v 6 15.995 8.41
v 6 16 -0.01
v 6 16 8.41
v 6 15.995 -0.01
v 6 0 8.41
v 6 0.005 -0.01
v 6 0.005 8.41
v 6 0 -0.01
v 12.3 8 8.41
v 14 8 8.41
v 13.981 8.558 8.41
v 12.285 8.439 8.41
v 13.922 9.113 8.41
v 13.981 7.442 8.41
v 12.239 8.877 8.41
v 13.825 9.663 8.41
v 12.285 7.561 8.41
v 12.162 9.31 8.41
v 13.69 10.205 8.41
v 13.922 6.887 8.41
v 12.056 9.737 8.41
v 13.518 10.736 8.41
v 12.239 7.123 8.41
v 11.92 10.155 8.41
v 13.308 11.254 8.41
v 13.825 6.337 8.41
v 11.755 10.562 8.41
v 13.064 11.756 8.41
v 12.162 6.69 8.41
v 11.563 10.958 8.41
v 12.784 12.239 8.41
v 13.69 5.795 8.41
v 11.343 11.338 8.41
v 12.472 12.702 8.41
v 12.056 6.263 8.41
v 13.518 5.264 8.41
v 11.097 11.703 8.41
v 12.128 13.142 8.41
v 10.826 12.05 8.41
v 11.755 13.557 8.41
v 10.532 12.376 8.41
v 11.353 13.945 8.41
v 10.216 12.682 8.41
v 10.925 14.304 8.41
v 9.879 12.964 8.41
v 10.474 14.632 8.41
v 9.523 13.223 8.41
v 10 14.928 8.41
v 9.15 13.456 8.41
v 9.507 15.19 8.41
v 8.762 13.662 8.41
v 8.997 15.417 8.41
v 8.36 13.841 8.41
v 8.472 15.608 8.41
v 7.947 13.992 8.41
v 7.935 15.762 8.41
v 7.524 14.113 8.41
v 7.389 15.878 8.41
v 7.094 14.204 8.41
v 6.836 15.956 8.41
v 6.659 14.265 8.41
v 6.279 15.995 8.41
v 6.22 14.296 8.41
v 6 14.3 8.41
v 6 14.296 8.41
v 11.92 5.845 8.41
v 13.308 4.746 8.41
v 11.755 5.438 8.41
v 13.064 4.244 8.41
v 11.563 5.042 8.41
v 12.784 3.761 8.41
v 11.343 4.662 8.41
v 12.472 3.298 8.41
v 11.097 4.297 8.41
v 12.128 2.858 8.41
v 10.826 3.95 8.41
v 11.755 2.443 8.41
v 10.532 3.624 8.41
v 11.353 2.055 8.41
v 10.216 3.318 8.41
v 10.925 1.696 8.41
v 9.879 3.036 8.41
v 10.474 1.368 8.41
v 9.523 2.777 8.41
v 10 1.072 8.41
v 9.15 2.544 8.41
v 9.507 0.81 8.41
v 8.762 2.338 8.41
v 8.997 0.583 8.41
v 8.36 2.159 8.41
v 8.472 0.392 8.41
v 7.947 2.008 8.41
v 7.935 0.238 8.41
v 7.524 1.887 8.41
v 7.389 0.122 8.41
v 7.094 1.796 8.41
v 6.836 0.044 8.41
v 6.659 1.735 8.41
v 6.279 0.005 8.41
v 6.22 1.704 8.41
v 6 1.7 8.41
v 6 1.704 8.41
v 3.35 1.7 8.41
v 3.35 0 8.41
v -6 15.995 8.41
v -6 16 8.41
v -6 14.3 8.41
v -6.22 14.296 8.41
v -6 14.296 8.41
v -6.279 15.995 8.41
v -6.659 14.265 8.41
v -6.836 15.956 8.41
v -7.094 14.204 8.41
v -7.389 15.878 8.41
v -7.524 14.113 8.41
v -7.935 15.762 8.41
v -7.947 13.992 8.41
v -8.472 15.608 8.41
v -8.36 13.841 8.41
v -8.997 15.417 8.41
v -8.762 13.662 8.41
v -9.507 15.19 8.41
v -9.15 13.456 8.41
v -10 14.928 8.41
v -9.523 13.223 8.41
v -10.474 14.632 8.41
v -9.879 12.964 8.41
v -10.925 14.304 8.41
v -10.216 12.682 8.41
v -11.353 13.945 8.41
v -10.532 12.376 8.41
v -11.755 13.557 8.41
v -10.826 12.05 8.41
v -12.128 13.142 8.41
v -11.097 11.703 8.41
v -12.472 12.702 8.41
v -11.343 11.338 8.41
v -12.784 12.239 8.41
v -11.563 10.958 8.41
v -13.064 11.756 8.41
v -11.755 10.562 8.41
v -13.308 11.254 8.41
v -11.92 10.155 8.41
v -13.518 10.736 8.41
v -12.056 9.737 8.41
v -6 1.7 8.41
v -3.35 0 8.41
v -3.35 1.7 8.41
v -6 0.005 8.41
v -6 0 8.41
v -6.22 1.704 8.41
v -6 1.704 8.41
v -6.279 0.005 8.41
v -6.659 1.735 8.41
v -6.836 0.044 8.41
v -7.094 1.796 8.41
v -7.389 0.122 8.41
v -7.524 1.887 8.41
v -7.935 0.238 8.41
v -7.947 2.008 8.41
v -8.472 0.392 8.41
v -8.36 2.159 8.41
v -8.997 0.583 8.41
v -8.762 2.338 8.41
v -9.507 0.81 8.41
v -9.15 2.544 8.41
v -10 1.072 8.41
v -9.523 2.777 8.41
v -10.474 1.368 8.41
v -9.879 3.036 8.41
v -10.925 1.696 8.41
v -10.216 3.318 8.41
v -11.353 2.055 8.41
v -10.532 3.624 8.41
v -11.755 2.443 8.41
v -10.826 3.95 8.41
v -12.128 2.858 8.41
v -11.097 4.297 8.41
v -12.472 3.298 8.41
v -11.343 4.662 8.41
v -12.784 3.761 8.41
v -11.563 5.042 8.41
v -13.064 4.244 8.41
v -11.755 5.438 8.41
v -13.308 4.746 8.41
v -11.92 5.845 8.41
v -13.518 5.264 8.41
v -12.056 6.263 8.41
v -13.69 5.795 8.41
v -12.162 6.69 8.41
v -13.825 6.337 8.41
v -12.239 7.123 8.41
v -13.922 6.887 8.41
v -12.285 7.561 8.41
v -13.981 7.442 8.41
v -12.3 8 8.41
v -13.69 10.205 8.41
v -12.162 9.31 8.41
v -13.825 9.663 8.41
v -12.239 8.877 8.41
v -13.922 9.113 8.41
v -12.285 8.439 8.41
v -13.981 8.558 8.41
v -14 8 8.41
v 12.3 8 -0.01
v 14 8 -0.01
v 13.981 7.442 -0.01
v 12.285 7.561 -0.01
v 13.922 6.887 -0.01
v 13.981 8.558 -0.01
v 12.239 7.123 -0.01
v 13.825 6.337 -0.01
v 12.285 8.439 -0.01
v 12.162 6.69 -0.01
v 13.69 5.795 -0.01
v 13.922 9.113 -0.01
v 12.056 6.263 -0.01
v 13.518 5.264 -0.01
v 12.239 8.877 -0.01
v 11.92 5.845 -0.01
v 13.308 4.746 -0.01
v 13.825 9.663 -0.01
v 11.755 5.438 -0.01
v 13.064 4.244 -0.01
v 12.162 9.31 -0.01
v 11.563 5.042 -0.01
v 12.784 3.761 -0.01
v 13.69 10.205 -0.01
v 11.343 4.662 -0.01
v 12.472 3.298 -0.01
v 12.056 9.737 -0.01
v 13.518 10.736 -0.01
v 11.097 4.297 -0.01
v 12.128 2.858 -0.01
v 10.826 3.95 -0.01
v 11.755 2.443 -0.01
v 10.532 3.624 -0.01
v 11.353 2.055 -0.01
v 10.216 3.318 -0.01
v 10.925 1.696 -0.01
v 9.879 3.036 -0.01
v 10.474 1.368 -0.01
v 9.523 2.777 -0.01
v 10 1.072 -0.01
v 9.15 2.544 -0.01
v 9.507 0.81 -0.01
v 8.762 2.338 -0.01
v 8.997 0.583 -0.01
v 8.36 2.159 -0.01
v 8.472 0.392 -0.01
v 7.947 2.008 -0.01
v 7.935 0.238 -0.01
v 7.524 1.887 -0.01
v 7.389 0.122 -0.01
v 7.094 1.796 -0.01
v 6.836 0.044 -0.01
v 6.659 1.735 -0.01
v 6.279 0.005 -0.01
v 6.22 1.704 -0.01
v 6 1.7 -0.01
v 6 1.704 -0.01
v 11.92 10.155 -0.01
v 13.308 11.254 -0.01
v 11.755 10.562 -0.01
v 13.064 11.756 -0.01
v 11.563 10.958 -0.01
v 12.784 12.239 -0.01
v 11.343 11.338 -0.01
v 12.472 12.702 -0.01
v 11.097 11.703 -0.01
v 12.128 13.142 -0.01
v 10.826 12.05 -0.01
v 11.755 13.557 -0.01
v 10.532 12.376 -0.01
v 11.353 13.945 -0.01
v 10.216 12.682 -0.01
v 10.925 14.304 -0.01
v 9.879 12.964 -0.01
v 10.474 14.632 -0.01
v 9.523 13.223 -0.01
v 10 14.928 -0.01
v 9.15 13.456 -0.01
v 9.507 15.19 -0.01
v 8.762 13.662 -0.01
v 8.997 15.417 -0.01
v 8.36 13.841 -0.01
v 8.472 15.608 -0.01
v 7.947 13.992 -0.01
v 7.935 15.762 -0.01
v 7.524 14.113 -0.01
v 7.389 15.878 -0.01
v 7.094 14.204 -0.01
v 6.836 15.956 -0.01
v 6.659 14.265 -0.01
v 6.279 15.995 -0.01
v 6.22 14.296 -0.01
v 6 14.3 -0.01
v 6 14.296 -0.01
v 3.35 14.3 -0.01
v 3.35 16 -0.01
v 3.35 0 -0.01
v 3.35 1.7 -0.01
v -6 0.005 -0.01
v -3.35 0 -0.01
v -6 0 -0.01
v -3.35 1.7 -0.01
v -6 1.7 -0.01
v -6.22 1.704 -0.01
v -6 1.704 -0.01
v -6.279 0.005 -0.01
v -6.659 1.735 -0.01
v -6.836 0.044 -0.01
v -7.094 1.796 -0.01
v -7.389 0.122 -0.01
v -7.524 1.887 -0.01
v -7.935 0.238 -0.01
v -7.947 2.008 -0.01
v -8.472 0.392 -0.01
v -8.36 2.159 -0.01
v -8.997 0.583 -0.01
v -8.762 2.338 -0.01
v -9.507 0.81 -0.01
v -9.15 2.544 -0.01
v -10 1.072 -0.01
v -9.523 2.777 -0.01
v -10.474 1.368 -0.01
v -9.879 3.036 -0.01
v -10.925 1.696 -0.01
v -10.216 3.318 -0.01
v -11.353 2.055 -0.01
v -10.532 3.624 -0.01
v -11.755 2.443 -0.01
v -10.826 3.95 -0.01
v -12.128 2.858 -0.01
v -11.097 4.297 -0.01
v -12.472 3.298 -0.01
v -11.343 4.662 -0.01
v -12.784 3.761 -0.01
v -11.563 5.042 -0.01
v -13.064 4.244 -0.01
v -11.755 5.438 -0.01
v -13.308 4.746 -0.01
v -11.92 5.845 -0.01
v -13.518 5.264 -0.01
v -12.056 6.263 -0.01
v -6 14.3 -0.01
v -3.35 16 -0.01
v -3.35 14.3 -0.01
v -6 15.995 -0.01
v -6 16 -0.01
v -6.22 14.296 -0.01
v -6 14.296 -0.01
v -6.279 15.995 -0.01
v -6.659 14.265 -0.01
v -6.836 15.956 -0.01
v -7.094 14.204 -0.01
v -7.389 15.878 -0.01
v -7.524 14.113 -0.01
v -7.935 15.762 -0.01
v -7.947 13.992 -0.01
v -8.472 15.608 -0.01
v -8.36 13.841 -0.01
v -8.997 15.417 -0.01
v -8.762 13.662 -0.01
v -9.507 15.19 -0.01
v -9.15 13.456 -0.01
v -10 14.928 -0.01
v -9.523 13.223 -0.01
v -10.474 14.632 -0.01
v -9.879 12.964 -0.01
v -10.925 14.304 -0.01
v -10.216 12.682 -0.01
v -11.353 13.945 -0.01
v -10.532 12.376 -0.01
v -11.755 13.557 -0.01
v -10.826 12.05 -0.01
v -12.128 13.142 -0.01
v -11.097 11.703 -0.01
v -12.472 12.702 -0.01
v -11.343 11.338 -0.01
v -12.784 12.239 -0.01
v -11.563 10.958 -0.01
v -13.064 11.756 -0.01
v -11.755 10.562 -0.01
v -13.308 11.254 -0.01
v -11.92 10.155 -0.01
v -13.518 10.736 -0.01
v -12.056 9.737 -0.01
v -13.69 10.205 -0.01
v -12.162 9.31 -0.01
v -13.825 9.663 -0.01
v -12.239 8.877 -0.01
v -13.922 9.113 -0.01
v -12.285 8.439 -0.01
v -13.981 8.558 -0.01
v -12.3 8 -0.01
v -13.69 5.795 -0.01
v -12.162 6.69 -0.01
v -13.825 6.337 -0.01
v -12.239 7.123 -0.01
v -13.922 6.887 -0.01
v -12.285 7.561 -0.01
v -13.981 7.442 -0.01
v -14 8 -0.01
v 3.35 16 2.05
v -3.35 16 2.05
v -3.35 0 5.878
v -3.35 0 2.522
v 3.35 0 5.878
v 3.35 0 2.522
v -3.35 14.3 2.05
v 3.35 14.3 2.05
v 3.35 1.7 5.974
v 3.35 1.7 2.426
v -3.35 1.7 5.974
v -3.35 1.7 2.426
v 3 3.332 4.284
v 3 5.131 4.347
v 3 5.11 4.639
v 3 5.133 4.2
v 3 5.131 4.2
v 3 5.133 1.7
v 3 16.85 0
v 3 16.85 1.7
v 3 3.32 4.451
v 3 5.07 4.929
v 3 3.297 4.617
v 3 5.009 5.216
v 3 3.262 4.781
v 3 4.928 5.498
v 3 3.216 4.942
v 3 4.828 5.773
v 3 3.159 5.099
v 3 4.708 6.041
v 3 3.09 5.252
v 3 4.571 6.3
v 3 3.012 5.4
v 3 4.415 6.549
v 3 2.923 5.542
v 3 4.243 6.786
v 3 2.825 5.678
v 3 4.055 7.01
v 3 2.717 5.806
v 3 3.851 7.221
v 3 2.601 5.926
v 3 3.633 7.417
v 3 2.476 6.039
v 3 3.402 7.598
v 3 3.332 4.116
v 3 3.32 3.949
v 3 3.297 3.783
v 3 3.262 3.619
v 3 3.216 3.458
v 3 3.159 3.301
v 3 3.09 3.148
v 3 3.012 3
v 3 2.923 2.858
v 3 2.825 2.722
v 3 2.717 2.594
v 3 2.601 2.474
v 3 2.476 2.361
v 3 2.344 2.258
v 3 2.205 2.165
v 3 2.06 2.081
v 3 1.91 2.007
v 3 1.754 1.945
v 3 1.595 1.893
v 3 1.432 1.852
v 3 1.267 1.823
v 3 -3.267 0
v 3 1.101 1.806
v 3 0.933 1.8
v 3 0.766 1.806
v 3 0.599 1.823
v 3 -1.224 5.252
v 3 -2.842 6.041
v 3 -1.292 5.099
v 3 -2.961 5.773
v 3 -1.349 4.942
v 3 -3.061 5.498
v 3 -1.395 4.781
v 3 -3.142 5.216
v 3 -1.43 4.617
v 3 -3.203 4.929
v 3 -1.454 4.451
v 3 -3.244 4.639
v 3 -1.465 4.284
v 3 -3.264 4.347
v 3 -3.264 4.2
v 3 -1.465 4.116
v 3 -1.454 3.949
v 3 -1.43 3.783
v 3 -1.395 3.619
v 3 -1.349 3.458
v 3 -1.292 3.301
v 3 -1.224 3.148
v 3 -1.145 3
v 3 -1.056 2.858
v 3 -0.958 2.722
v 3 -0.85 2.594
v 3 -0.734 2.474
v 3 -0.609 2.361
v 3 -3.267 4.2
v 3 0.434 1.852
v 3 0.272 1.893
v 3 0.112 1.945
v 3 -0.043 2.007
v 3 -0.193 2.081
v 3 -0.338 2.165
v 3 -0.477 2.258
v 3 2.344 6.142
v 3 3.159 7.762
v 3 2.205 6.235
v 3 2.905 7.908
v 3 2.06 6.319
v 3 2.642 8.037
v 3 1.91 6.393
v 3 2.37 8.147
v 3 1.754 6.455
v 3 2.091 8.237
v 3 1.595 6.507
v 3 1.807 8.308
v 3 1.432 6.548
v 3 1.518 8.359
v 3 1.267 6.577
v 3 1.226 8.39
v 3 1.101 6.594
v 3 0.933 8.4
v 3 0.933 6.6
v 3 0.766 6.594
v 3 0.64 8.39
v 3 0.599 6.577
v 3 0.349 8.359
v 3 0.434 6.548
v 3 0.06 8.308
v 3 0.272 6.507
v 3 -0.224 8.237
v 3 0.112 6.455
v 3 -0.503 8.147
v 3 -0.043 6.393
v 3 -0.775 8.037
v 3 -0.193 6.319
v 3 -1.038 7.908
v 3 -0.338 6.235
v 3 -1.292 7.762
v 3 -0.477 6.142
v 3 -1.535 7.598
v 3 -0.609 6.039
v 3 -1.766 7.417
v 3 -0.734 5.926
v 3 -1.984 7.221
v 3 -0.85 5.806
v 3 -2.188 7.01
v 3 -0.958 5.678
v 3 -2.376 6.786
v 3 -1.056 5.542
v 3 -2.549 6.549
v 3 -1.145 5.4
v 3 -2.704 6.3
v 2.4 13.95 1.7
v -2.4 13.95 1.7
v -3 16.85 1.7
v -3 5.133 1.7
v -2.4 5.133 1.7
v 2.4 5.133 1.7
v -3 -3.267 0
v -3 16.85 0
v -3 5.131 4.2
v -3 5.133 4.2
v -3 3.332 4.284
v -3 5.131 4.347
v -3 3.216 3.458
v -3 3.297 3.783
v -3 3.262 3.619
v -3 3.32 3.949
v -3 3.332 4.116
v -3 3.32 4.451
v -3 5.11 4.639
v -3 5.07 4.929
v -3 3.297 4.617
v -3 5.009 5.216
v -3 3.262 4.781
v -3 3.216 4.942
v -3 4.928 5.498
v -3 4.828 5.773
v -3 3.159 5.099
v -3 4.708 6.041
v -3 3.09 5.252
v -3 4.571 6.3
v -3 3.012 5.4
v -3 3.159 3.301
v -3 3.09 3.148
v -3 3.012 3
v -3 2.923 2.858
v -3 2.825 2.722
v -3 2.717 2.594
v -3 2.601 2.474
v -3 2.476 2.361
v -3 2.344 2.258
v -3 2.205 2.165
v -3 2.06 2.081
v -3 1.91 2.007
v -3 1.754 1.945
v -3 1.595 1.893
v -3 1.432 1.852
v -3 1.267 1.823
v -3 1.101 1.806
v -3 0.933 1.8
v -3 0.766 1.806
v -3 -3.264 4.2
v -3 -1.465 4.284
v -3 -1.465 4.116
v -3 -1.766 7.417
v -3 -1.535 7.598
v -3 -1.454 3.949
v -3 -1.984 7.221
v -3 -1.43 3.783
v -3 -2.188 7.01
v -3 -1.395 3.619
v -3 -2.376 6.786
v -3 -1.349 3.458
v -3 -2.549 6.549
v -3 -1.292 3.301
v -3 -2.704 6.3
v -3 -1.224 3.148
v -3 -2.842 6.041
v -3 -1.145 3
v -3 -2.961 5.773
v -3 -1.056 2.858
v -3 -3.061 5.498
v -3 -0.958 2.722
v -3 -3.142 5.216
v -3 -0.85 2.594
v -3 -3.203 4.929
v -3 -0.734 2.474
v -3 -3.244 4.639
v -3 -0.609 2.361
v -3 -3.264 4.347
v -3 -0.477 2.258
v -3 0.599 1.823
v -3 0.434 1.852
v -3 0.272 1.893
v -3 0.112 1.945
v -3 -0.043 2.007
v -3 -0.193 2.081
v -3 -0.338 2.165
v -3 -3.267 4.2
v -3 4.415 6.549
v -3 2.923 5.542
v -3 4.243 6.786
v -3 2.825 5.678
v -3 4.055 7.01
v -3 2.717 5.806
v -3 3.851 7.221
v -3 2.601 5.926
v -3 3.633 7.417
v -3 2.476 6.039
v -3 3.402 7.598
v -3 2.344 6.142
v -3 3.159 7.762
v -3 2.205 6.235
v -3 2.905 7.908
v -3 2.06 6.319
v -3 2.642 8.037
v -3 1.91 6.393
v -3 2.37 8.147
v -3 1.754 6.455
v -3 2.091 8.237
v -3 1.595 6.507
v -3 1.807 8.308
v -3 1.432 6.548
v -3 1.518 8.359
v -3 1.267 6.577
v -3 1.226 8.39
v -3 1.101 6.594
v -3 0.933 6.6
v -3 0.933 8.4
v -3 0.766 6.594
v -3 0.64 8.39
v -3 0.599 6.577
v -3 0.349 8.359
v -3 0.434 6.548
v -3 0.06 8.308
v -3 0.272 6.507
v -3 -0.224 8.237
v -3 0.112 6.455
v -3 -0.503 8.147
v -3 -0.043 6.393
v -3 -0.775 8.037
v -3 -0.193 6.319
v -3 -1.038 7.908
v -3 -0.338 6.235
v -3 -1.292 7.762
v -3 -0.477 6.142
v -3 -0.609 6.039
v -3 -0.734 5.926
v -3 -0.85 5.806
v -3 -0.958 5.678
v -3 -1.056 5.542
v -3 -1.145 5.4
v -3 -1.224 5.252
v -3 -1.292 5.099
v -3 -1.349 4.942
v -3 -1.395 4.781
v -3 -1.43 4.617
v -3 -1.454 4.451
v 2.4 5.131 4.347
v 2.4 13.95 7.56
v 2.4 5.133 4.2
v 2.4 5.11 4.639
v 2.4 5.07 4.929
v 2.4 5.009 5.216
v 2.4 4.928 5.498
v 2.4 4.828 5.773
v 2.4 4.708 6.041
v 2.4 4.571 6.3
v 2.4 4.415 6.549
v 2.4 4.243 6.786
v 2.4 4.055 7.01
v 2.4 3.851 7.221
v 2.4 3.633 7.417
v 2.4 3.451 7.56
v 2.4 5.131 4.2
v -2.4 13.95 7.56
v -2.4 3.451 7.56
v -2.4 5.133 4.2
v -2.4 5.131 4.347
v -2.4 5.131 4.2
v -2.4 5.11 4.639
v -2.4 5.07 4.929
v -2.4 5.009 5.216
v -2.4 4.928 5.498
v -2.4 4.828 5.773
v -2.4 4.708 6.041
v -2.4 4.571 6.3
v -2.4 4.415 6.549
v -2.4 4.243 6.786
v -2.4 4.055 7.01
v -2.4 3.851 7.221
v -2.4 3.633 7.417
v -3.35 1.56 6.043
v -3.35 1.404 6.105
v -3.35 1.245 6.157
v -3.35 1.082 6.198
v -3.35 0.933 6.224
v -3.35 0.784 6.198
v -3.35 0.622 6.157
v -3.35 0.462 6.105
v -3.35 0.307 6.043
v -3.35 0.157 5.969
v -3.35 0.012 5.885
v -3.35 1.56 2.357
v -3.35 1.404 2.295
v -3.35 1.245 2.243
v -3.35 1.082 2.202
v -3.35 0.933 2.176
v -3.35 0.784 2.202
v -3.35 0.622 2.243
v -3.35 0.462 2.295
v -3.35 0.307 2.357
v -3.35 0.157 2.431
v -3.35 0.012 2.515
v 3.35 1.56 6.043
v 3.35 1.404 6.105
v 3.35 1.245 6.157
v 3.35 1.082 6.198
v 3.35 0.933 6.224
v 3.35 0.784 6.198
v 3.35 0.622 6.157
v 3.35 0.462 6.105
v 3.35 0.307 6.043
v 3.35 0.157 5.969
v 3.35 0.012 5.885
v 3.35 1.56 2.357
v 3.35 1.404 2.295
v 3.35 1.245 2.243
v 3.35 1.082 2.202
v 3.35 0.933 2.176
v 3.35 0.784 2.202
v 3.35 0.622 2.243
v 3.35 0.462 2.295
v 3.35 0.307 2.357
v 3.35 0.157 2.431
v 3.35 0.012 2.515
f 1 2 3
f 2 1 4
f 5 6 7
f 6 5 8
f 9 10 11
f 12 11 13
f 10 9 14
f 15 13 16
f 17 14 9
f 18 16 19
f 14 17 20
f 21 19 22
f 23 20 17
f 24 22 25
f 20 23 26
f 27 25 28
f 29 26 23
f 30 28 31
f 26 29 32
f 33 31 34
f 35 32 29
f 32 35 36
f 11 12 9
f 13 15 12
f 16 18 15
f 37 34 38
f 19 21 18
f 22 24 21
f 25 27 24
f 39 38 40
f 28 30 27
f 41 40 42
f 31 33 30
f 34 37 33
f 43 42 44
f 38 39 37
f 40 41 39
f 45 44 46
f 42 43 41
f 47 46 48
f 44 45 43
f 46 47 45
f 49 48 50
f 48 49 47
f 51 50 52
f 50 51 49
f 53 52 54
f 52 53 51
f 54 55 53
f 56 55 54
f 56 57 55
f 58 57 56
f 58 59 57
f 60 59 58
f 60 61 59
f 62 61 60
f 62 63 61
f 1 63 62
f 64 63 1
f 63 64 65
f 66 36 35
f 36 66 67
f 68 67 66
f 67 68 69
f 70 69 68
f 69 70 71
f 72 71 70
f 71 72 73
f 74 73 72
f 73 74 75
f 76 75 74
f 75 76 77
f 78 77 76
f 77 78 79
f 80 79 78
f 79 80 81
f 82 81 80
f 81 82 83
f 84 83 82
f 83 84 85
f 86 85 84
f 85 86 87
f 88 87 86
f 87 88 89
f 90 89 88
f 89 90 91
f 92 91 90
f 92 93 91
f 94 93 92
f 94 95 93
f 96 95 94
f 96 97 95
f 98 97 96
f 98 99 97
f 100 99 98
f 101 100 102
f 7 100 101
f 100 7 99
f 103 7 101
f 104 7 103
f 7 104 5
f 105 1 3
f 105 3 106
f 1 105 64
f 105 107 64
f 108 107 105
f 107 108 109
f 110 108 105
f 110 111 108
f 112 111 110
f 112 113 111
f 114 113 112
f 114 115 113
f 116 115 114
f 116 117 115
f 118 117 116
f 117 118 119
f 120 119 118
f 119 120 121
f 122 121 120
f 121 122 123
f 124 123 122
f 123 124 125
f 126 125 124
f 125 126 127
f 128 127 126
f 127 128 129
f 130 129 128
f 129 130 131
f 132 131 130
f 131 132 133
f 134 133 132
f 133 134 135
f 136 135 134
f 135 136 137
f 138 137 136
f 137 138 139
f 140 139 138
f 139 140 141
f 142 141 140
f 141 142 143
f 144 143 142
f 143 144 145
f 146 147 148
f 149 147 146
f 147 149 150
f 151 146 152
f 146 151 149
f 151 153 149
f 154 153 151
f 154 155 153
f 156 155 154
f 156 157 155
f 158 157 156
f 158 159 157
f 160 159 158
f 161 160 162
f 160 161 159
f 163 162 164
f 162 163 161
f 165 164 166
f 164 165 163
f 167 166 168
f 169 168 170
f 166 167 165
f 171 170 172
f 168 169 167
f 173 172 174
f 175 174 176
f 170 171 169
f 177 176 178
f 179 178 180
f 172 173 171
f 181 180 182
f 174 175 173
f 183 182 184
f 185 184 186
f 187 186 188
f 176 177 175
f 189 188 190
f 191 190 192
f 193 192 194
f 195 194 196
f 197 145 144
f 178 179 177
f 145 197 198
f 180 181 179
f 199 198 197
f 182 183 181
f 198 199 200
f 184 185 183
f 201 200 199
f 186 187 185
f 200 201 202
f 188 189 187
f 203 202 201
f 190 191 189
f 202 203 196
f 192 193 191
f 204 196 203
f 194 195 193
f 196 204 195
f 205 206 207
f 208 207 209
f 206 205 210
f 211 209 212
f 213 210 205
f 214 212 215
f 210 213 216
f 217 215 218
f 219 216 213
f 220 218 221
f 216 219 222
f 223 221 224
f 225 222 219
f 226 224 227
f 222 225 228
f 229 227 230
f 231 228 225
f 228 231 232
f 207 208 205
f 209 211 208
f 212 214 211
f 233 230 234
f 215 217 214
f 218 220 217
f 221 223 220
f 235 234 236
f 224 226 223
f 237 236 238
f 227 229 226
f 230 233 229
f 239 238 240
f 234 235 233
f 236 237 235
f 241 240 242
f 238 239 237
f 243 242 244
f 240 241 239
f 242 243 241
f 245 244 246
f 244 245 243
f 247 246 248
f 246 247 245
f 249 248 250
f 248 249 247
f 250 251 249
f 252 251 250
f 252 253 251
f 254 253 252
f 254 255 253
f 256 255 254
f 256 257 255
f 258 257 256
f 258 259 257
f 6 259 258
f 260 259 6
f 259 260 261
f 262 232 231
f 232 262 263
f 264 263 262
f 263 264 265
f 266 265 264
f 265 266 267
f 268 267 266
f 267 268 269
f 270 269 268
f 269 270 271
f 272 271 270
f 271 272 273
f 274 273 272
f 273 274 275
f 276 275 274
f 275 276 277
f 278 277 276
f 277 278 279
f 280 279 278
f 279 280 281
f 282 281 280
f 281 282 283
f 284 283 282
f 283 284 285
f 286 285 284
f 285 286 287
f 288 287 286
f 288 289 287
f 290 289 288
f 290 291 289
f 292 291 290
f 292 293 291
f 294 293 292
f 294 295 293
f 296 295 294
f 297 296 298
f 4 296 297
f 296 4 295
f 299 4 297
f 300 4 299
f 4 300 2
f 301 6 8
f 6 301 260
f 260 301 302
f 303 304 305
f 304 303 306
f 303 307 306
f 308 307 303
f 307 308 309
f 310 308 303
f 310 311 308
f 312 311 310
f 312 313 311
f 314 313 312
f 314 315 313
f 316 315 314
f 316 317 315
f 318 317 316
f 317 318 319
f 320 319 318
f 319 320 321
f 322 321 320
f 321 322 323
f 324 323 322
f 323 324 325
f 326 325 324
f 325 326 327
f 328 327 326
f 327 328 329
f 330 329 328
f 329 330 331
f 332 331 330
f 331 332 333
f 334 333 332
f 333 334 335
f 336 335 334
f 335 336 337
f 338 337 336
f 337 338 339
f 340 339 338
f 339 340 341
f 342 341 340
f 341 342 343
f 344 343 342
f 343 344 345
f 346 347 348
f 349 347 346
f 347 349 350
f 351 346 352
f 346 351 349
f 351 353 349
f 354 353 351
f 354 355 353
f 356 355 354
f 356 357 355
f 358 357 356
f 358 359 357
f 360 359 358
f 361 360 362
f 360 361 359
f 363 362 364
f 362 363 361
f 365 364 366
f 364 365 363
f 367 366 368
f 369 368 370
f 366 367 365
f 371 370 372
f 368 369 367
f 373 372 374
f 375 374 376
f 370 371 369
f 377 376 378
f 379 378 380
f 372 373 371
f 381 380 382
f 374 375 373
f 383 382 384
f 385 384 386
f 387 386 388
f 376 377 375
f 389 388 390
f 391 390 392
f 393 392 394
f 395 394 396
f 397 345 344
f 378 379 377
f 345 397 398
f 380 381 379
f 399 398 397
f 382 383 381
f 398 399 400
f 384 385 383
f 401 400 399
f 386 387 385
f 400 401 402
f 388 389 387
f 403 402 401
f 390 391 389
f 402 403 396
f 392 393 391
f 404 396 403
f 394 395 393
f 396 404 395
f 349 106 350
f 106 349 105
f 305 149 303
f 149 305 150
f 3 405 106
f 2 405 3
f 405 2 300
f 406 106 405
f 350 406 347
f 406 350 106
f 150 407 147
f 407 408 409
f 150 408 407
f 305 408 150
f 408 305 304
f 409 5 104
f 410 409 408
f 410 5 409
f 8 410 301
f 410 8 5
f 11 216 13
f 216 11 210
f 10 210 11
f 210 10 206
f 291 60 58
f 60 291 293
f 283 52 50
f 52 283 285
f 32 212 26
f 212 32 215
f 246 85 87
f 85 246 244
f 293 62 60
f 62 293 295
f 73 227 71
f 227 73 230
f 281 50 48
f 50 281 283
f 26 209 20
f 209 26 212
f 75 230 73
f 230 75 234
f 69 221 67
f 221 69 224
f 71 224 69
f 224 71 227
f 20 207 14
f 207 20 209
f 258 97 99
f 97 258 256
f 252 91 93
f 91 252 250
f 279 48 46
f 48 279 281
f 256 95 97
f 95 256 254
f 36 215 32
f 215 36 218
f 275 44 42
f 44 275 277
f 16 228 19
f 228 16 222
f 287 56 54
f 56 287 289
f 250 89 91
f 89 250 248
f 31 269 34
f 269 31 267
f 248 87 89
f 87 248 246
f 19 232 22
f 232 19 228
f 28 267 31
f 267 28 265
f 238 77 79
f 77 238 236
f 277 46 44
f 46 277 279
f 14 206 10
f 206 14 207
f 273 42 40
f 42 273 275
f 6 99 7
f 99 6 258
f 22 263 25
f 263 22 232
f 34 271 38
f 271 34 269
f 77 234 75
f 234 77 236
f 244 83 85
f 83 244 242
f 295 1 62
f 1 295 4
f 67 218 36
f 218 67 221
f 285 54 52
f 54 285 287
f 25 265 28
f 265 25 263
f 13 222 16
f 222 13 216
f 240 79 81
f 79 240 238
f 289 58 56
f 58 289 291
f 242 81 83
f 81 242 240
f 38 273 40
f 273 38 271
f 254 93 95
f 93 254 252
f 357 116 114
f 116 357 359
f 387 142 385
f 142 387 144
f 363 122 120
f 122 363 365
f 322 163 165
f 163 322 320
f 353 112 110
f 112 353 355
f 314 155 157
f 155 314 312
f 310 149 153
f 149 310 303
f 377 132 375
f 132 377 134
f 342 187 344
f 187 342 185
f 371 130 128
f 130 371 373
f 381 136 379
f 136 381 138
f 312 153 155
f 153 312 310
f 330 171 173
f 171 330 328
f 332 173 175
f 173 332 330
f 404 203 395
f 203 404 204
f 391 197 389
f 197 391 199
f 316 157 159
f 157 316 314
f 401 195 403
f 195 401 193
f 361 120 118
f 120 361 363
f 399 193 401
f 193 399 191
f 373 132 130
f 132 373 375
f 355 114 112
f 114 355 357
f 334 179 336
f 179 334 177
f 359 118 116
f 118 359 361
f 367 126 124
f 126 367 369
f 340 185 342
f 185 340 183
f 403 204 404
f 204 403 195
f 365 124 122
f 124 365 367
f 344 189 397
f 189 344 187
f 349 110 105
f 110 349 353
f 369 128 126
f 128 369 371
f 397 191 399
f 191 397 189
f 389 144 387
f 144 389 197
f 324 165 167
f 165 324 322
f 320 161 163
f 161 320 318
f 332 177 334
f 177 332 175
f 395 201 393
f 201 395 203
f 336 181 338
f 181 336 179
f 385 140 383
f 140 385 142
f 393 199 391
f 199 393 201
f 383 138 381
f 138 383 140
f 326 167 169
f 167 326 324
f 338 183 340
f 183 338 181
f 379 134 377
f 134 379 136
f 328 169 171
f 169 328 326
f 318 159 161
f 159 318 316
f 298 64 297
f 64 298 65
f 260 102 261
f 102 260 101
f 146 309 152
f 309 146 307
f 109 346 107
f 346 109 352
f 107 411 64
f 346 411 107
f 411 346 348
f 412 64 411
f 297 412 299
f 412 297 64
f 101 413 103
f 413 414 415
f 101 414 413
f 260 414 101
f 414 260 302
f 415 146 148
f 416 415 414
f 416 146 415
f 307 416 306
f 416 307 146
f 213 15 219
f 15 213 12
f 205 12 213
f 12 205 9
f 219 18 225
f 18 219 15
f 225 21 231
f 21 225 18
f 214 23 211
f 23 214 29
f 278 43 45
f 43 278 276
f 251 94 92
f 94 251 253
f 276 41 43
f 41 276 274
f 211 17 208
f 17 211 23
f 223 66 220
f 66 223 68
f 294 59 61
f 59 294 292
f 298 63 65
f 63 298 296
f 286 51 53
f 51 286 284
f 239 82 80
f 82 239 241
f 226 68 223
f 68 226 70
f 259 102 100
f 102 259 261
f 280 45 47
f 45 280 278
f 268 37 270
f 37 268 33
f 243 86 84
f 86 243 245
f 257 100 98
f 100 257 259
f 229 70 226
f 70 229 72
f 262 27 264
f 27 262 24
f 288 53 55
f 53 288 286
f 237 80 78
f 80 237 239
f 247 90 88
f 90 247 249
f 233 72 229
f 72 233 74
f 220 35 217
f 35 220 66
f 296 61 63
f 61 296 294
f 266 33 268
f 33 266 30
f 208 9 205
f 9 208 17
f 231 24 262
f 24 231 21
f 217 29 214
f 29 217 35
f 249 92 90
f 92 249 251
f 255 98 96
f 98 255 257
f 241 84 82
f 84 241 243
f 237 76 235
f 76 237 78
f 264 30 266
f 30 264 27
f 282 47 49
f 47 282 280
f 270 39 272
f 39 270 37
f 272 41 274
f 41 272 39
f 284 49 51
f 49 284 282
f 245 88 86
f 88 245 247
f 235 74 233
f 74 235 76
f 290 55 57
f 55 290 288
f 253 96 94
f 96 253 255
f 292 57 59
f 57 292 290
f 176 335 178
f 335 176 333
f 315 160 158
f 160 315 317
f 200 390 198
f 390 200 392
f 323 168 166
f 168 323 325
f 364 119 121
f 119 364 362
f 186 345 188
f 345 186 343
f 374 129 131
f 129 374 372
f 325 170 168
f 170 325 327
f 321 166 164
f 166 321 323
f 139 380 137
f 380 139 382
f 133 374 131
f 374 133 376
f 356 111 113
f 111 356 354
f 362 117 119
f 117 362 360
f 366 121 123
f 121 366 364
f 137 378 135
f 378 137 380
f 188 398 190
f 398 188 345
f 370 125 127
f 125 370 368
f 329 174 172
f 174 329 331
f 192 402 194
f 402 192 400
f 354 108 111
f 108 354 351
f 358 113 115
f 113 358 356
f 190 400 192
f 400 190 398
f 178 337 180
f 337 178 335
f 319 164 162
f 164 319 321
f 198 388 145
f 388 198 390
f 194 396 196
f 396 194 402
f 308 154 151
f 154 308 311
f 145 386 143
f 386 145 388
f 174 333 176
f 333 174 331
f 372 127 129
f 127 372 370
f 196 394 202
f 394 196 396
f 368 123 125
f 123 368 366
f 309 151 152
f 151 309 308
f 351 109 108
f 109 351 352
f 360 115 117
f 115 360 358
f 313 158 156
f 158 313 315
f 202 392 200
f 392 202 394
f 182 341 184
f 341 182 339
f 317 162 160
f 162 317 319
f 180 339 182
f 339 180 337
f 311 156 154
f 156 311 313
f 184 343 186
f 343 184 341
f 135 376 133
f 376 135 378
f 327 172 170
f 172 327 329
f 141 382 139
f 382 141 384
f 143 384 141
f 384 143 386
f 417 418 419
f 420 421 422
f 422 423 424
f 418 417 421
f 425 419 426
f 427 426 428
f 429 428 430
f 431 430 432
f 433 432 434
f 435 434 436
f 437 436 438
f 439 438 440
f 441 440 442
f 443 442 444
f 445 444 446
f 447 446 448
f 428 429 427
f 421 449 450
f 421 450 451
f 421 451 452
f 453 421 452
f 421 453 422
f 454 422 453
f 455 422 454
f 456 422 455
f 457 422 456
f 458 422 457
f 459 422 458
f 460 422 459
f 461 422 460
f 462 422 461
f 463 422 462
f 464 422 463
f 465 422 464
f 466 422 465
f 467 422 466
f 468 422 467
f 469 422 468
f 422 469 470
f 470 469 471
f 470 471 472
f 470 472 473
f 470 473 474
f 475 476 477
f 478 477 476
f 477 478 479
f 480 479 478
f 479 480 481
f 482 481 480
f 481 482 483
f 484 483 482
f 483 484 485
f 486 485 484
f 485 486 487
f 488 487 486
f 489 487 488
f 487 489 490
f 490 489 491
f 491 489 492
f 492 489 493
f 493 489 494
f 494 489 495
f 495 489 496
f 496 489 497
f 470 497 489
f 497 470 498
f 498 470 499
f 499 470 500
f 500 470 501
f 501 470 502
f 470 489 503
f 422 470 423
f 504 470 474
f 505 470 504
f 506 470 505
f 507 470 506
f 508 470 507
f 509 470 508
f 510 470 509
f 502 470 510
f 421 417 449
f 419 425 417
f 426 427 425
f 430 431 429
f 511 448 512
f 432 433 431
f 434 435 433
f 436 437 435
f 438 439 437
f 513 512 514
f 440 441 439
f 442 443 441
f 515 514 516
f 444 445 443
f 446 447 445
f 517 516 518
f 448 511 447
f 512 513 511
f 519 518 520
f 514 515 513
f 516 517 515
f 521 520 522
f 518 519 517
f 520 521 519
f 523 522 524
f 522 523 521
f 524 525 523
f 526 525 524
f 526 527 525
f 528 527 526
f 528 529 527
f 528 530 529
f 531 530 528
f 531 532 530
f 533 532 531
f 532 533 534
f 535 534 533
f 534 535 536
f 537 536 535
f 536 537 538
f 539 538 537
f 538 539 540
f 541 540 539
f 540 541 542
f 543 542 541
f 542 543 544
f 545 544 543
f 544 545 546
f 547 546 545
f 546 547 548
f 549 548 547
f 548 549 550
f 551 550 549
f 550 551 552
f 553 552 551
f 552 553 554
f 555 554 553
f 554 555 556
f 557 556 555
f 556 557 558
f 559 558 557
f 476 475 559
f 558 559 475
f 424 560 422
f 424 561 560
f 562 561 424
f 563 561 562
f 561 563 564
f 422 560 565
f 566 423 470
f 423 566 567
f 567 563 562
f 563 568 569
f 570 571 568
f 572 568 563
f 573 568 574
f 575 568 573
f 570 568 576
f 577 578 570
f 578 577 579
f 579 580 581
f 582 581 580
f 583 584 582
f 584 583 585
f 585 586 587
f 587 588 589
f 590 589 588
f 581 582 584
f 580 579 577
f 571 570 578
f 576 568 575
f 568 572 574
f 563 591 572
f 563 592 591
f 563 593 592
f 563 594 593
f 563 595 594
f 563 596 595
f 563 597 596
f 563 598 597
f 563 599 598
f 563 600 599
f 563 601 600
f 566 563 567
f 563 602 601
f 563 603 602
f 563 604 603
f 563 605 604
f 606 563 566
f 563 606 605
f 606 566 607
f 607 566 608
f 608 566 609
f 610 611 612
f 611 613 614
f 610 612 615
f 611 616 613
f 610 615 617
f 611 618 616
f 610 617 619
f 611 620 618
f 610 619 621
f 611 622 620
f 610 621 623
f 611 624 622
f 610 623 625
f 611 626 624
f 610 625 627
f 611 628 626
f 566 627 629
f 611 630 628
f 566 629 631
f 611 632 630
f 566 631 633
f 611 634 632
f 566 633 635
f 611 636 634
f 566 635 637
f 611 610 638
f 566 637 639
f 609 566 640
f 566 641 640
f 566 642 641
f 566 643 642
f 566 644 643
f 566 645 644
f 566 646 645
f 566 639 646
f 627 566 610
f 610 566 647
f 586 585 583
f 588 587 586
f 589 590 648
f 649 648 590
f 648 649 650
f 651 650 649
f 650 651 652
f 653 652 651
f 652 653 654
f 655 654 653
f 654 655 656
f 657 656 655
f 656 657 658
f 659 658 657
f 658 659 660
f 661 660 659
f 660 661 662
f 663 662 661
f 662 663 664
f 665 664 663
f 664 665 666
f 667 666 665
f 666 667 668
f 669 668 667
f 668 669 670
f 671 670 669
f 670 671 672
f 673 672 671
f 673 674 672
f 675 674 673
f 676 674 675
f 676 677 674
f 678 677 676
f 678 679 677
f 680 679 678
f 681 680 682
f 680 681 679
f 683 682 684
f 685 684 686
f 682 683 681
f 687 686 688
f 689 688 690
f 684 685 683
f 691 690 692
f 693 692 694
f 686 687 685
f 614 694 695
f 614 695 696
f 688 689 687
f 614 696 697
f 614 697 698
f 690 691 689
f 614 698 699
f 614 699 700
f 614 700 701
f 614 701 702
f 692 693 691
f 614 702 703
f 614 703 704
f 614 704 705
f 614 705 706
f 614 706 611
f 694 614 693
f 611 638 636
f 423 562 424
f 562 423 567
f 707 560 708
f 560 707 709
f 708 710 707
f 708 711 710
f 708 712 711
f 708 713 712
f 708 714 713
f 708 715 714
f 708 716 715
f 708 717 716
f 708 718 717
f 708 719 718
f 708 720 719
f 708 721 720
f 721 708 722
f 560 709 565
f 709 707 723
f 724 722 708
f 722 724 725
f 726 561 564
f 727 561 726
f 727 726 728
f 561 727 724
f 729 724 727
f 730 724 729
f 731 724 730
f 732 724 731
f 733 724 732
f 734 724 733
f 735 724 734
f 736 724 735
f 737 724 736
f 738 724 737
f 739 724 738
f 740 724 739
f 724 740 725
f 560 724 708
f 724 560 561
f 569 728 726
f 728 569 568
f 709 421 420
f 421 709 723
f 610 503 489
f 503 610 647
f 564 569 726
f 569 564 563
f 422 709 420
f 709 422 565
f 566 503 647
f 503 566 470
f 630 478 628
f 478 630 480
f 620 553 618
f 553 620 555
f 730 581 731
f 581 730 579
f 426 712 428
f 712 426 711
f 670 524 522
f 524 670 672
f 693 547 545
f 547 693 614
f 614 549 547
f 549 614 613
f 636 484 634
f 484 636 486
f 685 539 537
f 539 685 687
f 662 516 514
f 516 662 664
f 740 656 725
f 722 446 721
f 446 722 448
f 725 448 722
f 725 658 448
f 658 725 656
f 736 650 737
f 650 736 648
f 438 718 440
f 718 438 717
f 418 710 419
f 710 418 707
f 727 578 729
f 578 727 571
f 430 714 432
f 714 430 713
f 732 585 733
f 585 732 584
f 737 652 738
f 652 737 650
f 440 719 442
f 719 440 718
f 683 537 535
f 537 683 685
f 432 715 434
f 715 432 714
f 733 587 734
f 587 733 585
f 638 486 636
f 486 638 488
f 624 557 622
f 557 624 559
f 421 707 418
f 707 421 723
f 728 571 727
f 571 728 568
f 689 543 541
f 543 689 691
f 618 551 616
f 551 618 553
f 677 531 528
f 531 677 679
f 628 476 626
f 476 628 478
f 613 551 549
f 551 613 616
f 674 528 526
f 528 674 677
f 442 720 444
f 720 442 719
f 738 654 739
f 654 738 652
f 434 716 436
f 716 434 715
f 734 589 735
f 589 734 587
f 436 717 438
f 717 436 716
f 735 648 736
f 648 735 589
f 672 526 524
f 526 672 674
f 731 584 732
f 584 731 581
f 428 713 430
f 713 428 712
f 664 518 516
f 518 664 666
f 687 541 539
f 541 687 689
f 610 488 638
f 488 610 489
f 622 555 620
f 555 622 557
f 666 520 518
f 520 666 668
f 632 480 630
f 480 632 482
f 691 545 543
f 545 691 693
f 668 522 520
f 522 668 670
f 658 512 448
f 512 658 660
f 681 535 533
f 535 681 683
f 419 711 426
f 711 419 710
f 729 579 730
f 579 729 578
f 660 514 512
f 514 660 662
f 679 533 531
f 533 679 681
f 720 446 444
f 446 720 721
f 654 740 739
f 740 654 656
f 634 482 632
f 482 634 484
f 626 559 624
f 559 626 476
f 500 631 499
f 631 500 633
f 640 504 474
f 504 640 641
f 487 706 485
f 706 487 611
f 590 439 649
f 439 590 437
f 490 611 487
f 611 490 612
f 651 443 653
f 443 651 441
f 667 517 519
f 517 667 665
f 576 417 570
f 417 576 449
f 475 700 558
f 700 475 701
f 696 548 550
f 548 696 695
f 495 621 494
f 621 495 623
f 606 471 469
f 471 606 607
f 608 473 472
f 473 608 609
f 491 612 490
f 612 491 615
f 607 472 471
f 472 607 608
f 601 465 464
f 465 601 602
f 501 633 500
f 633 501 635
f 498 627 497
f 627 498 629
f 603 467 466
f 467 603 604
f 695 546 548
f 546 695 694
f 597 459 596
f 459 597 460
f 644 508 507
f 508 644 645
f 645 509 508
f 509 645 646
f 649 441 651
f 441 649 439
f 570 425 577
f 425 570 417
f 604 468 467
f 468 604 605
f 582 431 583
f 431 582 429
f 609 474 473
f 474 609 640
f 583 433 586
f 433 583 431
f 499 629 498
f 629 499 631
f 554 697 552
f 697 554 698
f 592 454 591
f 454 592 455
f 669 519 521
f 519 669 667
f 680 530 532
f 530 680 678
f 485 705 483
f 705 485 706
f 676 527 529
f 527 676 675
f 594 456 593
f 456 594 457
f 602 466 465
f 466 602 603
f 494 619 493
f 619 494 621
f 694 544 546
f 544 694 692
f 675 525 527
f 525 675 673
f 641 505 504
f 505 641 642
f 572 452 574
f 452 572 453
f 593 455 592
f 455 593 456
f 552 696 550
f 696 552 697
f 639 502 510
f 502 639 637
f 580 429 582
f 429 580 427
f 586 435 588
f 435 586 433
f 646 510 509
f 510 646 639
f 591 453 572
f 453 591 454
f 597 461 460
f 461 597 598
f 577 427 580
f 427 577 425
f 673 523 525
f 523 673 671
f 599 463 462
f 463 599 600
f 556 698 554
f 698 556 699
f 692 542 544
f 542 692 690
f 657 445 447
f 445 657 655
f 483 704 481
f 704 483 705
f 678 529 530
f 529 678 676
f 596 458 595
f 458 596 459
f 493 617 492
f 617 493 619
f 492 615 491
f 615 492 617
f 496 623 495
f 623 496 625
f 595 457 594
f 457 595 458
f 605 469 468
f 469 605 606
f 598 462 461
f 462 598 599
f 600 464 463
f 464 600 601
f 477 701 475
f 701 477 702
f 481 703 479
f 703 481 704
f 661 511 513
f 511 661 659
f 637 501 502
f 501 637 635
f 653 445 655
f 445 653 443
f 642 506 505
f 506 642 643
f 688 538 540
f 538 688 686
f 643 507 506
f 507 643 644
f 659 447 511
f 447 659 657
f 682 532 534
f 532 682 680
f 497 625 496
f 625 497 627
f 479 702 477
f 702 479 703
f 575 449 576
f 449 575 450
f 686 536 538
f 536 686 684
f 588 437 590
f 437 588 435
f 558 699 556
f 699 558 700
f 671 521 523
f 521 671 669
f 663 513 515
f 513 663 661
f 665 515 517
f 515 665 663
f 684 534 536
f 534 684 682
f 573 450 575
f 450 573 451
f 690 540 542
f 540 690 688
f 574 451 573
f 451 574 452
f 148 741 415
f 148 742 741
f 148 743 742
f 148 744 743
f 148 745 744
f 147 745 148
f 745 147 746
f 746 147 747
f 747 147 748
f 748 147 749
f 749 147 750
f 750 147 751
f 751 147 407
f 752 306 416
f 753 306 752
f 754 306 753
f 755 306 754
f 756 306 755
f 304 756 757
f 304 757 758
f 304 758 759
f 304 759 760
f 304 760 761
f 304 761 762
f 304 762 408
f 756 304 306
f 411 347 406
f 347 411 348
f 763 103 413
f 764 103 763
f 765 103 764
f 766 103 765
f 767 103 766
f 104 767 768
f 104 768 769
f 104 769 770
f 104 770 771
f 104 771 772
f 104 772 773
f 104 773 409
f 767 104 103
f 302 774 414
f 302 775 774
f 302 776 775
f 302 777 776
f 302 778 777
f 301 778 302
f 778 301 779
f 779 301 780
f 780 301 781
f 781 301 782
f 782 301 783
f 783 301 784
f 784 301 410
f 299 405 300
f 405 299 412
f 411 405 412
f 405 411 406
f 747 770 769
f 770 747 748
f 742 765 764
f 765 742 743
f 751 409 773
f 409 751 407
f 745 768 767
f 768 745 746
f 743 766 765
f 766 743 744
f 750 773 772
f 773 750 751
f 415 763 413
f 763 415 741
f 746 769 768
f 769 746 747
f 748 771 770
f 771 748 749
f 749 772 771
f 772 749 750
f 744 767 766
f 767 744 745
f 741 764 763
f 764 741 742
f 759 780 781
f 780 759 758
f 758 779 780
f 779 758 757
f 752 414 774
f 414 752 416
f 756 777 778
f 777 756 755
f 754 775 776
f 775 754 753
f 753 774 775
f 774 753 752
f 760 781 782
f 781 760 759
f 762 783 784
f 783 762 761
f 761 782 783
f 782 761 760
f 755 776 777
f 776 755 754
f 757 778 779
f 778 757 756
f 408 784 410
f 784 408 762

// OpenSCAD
/* OpenSCAD project.
 * Buckles to hold cables together. 4 different sizes.
 *
 * (C) 2019 by P. Bauermeister
 *
 * See https://github.com/pbauermeister/DIY/tree/master/3d-printing/2019-07-09--earphone-buckles
*/

// Object sizes
SMALL_HEIGHT          =  8.4;
SMALL_WALL_THICKNESS  =  1.7;
SMALL_LENGTH          = 28.0;
SMALL_WIDTH           = 16.0;
SMALL_PRONG_SIZE      =  6.0;

MEDIUM_HEIGHT         =  8.4;
MEDIUM_WALL_THICKNESS =  1.7;
MEDIUM_LENGTH         = 32.0;
MEDIUM_WIDTH          = 17.0;
MEDIUM_PRONG_SIZE     =  7.0;

BIG_HEIGHT            =  8.4;
BIG_WALL_THICKNESS    =  1.9;
BIG_LENGTH            = 40.0;
BIG_WIDTH             = 20.0;
BIG_PRONG_SIZE        =  8.0;

BIGGER_HEIGHT         =  8.4;
BIGGER_WALL_THICKNESS =  1.7;
BIGGER_LENGTH         = 56.0;
BIGGER_WIDTH          = 32.0;
BIGGER_PRONG_SIZE     =  9.0;

// Rendering
DRAFT = false; // false: final rendering, true: disable Minkowski
$fn = 90;

// Globals
PLAY  = 0.7;
SPACE = PLAY/2;
ATOM  = 0.01;

// Transform: Grow object, useful to carve another object with a play margin
module grow_object() {
    if (DRAFT) {
        // do not grow, much faster
        children();
    } else {
        // grow size in each dimension (by a cube)
        minkowski() {
            children();
            cube([PLAY, PLAY, PLAY], true);
        }
    }
}

// Transform: Shift object in Y direction
module move(by) {
    translate([0, by, 0])
    children();
}

// Helper object: A hollow full buckle, to create the base object, as well as as a cavity
module full_buckle(offset, height, length, width) {
    // body
    cube([length - width, width - offset*2, height + ATOM*2], true);

    // rounded ends

    translate([length/2 - width/2, 0, 0])
    cylinder(d=width - offset*2, h=height + ATOM*2, center=true);

    translate([-length/2 + width/2, 0, 0])
    cylinder(d=width - offset*2, h=height + ATOM*2, center=true);
}

// Helper object: A hollow raw buckle
module hollow_buckle(height, wall_thickness, length, width) {
    translate([0, 0, height/2])
    difference() {
        full_buckle(0, height, length, width);
        full_buckle(wall_thickness, height + ATOM, length, width);
    }
}

// Object: The prong
module prong(wall_thickness, height, length, width, prong_size) {
    prong_width = prong_size;
    prong_width2 = prong_size * .8;
    hinge_radius = height/2;

    difference() {
        union() {
            // arm

            translate([-prong_width/2, -width/2 + wall_thickness/2, 0])
            cube([prong_width, width, wall_thickness]);

            translate([-prong_width2/2, -width/2 + wall_thickness/2, 0])
            cube([prong_width2, width -wall_thickness*1.5 - SPACE, height*.9]);

            // hinge

            translate([-prong_width/2, -width/2 + hinge_radius/4.5 - hinge_radius, 0])
            cube([prong_width, hinge_radius*2, hinge_radius]);

            translate([-prong_width/2, -width/2 + hinge_radius/4.5, hinge_radius])
            rotate([0, 90, 0])
            cylinder(r=hinge_radius, h=prong_width);
        }
        // hinge hole
        translate([-prong_width/2-1, -width/2 + hinge_radius/4.5, hinge_radius])
        rotate([0, 90, 0])
        cylinder(r=hinge_radius/1.75, h=prong_width + 2);
    }
}

// Object: Buckle, carved to make room for the prong
module buckle(height, wall_thickness, length, width, prong_size) {
    difference() {
        hollow_buckle(height, wall_thickness, length, width);
        grow_object() prong(wall_thickness, height, length, width, prong_size);
    }
}

// Object: One whole finished object (buckle and prong)
module unit(height, wall_thickness, length, width, prong_size) {
    buckle(height, wall_thickness, length, width, prong_size);
    prong(wall_thickness, height, length, width, prong_size);
}

// Here it goes: make several copies of various sizes

move(SMALL_WIDTH/2)
unit(SMALL_HEIGHT, SMALL_WALL_THICKNESS, SMALL_LENGTH, SMALL_WIDTH, SMALL_PRONG_SIZE);

/*
move(SMALL_WIDTH + MEDIUM_WIDTH/2 + 5)
unit(MEDIUM_HEIGHT, MEDIUM_WALL_THICKNESS, MEDIUM_LENGTH, MEDIUM_WIDTH, MEDIUM_PRONG_SIZE);

move(SMALL_WIDTH + MEDIUM_WIDTH + BIG_WIDTH/2 +10)
unit(BIG_HEIGHT, BIG_WALL_THICKNESS, BIG_LENGTH, BIG_WIDTH, BIG_PRONG_SIZE);

move(SMALL_WIDTH + MEDIUM_WIDTH + BIG_WIDTH + BIGGER_WIDTH/2 +15)
unit(BIGGER_HEIGHT, BIGGER_WALL_THICKNESS, BIGGER_LENGTH, BIGGER_WIDTH, BIGGER_PRONG_SIZE);
*/
